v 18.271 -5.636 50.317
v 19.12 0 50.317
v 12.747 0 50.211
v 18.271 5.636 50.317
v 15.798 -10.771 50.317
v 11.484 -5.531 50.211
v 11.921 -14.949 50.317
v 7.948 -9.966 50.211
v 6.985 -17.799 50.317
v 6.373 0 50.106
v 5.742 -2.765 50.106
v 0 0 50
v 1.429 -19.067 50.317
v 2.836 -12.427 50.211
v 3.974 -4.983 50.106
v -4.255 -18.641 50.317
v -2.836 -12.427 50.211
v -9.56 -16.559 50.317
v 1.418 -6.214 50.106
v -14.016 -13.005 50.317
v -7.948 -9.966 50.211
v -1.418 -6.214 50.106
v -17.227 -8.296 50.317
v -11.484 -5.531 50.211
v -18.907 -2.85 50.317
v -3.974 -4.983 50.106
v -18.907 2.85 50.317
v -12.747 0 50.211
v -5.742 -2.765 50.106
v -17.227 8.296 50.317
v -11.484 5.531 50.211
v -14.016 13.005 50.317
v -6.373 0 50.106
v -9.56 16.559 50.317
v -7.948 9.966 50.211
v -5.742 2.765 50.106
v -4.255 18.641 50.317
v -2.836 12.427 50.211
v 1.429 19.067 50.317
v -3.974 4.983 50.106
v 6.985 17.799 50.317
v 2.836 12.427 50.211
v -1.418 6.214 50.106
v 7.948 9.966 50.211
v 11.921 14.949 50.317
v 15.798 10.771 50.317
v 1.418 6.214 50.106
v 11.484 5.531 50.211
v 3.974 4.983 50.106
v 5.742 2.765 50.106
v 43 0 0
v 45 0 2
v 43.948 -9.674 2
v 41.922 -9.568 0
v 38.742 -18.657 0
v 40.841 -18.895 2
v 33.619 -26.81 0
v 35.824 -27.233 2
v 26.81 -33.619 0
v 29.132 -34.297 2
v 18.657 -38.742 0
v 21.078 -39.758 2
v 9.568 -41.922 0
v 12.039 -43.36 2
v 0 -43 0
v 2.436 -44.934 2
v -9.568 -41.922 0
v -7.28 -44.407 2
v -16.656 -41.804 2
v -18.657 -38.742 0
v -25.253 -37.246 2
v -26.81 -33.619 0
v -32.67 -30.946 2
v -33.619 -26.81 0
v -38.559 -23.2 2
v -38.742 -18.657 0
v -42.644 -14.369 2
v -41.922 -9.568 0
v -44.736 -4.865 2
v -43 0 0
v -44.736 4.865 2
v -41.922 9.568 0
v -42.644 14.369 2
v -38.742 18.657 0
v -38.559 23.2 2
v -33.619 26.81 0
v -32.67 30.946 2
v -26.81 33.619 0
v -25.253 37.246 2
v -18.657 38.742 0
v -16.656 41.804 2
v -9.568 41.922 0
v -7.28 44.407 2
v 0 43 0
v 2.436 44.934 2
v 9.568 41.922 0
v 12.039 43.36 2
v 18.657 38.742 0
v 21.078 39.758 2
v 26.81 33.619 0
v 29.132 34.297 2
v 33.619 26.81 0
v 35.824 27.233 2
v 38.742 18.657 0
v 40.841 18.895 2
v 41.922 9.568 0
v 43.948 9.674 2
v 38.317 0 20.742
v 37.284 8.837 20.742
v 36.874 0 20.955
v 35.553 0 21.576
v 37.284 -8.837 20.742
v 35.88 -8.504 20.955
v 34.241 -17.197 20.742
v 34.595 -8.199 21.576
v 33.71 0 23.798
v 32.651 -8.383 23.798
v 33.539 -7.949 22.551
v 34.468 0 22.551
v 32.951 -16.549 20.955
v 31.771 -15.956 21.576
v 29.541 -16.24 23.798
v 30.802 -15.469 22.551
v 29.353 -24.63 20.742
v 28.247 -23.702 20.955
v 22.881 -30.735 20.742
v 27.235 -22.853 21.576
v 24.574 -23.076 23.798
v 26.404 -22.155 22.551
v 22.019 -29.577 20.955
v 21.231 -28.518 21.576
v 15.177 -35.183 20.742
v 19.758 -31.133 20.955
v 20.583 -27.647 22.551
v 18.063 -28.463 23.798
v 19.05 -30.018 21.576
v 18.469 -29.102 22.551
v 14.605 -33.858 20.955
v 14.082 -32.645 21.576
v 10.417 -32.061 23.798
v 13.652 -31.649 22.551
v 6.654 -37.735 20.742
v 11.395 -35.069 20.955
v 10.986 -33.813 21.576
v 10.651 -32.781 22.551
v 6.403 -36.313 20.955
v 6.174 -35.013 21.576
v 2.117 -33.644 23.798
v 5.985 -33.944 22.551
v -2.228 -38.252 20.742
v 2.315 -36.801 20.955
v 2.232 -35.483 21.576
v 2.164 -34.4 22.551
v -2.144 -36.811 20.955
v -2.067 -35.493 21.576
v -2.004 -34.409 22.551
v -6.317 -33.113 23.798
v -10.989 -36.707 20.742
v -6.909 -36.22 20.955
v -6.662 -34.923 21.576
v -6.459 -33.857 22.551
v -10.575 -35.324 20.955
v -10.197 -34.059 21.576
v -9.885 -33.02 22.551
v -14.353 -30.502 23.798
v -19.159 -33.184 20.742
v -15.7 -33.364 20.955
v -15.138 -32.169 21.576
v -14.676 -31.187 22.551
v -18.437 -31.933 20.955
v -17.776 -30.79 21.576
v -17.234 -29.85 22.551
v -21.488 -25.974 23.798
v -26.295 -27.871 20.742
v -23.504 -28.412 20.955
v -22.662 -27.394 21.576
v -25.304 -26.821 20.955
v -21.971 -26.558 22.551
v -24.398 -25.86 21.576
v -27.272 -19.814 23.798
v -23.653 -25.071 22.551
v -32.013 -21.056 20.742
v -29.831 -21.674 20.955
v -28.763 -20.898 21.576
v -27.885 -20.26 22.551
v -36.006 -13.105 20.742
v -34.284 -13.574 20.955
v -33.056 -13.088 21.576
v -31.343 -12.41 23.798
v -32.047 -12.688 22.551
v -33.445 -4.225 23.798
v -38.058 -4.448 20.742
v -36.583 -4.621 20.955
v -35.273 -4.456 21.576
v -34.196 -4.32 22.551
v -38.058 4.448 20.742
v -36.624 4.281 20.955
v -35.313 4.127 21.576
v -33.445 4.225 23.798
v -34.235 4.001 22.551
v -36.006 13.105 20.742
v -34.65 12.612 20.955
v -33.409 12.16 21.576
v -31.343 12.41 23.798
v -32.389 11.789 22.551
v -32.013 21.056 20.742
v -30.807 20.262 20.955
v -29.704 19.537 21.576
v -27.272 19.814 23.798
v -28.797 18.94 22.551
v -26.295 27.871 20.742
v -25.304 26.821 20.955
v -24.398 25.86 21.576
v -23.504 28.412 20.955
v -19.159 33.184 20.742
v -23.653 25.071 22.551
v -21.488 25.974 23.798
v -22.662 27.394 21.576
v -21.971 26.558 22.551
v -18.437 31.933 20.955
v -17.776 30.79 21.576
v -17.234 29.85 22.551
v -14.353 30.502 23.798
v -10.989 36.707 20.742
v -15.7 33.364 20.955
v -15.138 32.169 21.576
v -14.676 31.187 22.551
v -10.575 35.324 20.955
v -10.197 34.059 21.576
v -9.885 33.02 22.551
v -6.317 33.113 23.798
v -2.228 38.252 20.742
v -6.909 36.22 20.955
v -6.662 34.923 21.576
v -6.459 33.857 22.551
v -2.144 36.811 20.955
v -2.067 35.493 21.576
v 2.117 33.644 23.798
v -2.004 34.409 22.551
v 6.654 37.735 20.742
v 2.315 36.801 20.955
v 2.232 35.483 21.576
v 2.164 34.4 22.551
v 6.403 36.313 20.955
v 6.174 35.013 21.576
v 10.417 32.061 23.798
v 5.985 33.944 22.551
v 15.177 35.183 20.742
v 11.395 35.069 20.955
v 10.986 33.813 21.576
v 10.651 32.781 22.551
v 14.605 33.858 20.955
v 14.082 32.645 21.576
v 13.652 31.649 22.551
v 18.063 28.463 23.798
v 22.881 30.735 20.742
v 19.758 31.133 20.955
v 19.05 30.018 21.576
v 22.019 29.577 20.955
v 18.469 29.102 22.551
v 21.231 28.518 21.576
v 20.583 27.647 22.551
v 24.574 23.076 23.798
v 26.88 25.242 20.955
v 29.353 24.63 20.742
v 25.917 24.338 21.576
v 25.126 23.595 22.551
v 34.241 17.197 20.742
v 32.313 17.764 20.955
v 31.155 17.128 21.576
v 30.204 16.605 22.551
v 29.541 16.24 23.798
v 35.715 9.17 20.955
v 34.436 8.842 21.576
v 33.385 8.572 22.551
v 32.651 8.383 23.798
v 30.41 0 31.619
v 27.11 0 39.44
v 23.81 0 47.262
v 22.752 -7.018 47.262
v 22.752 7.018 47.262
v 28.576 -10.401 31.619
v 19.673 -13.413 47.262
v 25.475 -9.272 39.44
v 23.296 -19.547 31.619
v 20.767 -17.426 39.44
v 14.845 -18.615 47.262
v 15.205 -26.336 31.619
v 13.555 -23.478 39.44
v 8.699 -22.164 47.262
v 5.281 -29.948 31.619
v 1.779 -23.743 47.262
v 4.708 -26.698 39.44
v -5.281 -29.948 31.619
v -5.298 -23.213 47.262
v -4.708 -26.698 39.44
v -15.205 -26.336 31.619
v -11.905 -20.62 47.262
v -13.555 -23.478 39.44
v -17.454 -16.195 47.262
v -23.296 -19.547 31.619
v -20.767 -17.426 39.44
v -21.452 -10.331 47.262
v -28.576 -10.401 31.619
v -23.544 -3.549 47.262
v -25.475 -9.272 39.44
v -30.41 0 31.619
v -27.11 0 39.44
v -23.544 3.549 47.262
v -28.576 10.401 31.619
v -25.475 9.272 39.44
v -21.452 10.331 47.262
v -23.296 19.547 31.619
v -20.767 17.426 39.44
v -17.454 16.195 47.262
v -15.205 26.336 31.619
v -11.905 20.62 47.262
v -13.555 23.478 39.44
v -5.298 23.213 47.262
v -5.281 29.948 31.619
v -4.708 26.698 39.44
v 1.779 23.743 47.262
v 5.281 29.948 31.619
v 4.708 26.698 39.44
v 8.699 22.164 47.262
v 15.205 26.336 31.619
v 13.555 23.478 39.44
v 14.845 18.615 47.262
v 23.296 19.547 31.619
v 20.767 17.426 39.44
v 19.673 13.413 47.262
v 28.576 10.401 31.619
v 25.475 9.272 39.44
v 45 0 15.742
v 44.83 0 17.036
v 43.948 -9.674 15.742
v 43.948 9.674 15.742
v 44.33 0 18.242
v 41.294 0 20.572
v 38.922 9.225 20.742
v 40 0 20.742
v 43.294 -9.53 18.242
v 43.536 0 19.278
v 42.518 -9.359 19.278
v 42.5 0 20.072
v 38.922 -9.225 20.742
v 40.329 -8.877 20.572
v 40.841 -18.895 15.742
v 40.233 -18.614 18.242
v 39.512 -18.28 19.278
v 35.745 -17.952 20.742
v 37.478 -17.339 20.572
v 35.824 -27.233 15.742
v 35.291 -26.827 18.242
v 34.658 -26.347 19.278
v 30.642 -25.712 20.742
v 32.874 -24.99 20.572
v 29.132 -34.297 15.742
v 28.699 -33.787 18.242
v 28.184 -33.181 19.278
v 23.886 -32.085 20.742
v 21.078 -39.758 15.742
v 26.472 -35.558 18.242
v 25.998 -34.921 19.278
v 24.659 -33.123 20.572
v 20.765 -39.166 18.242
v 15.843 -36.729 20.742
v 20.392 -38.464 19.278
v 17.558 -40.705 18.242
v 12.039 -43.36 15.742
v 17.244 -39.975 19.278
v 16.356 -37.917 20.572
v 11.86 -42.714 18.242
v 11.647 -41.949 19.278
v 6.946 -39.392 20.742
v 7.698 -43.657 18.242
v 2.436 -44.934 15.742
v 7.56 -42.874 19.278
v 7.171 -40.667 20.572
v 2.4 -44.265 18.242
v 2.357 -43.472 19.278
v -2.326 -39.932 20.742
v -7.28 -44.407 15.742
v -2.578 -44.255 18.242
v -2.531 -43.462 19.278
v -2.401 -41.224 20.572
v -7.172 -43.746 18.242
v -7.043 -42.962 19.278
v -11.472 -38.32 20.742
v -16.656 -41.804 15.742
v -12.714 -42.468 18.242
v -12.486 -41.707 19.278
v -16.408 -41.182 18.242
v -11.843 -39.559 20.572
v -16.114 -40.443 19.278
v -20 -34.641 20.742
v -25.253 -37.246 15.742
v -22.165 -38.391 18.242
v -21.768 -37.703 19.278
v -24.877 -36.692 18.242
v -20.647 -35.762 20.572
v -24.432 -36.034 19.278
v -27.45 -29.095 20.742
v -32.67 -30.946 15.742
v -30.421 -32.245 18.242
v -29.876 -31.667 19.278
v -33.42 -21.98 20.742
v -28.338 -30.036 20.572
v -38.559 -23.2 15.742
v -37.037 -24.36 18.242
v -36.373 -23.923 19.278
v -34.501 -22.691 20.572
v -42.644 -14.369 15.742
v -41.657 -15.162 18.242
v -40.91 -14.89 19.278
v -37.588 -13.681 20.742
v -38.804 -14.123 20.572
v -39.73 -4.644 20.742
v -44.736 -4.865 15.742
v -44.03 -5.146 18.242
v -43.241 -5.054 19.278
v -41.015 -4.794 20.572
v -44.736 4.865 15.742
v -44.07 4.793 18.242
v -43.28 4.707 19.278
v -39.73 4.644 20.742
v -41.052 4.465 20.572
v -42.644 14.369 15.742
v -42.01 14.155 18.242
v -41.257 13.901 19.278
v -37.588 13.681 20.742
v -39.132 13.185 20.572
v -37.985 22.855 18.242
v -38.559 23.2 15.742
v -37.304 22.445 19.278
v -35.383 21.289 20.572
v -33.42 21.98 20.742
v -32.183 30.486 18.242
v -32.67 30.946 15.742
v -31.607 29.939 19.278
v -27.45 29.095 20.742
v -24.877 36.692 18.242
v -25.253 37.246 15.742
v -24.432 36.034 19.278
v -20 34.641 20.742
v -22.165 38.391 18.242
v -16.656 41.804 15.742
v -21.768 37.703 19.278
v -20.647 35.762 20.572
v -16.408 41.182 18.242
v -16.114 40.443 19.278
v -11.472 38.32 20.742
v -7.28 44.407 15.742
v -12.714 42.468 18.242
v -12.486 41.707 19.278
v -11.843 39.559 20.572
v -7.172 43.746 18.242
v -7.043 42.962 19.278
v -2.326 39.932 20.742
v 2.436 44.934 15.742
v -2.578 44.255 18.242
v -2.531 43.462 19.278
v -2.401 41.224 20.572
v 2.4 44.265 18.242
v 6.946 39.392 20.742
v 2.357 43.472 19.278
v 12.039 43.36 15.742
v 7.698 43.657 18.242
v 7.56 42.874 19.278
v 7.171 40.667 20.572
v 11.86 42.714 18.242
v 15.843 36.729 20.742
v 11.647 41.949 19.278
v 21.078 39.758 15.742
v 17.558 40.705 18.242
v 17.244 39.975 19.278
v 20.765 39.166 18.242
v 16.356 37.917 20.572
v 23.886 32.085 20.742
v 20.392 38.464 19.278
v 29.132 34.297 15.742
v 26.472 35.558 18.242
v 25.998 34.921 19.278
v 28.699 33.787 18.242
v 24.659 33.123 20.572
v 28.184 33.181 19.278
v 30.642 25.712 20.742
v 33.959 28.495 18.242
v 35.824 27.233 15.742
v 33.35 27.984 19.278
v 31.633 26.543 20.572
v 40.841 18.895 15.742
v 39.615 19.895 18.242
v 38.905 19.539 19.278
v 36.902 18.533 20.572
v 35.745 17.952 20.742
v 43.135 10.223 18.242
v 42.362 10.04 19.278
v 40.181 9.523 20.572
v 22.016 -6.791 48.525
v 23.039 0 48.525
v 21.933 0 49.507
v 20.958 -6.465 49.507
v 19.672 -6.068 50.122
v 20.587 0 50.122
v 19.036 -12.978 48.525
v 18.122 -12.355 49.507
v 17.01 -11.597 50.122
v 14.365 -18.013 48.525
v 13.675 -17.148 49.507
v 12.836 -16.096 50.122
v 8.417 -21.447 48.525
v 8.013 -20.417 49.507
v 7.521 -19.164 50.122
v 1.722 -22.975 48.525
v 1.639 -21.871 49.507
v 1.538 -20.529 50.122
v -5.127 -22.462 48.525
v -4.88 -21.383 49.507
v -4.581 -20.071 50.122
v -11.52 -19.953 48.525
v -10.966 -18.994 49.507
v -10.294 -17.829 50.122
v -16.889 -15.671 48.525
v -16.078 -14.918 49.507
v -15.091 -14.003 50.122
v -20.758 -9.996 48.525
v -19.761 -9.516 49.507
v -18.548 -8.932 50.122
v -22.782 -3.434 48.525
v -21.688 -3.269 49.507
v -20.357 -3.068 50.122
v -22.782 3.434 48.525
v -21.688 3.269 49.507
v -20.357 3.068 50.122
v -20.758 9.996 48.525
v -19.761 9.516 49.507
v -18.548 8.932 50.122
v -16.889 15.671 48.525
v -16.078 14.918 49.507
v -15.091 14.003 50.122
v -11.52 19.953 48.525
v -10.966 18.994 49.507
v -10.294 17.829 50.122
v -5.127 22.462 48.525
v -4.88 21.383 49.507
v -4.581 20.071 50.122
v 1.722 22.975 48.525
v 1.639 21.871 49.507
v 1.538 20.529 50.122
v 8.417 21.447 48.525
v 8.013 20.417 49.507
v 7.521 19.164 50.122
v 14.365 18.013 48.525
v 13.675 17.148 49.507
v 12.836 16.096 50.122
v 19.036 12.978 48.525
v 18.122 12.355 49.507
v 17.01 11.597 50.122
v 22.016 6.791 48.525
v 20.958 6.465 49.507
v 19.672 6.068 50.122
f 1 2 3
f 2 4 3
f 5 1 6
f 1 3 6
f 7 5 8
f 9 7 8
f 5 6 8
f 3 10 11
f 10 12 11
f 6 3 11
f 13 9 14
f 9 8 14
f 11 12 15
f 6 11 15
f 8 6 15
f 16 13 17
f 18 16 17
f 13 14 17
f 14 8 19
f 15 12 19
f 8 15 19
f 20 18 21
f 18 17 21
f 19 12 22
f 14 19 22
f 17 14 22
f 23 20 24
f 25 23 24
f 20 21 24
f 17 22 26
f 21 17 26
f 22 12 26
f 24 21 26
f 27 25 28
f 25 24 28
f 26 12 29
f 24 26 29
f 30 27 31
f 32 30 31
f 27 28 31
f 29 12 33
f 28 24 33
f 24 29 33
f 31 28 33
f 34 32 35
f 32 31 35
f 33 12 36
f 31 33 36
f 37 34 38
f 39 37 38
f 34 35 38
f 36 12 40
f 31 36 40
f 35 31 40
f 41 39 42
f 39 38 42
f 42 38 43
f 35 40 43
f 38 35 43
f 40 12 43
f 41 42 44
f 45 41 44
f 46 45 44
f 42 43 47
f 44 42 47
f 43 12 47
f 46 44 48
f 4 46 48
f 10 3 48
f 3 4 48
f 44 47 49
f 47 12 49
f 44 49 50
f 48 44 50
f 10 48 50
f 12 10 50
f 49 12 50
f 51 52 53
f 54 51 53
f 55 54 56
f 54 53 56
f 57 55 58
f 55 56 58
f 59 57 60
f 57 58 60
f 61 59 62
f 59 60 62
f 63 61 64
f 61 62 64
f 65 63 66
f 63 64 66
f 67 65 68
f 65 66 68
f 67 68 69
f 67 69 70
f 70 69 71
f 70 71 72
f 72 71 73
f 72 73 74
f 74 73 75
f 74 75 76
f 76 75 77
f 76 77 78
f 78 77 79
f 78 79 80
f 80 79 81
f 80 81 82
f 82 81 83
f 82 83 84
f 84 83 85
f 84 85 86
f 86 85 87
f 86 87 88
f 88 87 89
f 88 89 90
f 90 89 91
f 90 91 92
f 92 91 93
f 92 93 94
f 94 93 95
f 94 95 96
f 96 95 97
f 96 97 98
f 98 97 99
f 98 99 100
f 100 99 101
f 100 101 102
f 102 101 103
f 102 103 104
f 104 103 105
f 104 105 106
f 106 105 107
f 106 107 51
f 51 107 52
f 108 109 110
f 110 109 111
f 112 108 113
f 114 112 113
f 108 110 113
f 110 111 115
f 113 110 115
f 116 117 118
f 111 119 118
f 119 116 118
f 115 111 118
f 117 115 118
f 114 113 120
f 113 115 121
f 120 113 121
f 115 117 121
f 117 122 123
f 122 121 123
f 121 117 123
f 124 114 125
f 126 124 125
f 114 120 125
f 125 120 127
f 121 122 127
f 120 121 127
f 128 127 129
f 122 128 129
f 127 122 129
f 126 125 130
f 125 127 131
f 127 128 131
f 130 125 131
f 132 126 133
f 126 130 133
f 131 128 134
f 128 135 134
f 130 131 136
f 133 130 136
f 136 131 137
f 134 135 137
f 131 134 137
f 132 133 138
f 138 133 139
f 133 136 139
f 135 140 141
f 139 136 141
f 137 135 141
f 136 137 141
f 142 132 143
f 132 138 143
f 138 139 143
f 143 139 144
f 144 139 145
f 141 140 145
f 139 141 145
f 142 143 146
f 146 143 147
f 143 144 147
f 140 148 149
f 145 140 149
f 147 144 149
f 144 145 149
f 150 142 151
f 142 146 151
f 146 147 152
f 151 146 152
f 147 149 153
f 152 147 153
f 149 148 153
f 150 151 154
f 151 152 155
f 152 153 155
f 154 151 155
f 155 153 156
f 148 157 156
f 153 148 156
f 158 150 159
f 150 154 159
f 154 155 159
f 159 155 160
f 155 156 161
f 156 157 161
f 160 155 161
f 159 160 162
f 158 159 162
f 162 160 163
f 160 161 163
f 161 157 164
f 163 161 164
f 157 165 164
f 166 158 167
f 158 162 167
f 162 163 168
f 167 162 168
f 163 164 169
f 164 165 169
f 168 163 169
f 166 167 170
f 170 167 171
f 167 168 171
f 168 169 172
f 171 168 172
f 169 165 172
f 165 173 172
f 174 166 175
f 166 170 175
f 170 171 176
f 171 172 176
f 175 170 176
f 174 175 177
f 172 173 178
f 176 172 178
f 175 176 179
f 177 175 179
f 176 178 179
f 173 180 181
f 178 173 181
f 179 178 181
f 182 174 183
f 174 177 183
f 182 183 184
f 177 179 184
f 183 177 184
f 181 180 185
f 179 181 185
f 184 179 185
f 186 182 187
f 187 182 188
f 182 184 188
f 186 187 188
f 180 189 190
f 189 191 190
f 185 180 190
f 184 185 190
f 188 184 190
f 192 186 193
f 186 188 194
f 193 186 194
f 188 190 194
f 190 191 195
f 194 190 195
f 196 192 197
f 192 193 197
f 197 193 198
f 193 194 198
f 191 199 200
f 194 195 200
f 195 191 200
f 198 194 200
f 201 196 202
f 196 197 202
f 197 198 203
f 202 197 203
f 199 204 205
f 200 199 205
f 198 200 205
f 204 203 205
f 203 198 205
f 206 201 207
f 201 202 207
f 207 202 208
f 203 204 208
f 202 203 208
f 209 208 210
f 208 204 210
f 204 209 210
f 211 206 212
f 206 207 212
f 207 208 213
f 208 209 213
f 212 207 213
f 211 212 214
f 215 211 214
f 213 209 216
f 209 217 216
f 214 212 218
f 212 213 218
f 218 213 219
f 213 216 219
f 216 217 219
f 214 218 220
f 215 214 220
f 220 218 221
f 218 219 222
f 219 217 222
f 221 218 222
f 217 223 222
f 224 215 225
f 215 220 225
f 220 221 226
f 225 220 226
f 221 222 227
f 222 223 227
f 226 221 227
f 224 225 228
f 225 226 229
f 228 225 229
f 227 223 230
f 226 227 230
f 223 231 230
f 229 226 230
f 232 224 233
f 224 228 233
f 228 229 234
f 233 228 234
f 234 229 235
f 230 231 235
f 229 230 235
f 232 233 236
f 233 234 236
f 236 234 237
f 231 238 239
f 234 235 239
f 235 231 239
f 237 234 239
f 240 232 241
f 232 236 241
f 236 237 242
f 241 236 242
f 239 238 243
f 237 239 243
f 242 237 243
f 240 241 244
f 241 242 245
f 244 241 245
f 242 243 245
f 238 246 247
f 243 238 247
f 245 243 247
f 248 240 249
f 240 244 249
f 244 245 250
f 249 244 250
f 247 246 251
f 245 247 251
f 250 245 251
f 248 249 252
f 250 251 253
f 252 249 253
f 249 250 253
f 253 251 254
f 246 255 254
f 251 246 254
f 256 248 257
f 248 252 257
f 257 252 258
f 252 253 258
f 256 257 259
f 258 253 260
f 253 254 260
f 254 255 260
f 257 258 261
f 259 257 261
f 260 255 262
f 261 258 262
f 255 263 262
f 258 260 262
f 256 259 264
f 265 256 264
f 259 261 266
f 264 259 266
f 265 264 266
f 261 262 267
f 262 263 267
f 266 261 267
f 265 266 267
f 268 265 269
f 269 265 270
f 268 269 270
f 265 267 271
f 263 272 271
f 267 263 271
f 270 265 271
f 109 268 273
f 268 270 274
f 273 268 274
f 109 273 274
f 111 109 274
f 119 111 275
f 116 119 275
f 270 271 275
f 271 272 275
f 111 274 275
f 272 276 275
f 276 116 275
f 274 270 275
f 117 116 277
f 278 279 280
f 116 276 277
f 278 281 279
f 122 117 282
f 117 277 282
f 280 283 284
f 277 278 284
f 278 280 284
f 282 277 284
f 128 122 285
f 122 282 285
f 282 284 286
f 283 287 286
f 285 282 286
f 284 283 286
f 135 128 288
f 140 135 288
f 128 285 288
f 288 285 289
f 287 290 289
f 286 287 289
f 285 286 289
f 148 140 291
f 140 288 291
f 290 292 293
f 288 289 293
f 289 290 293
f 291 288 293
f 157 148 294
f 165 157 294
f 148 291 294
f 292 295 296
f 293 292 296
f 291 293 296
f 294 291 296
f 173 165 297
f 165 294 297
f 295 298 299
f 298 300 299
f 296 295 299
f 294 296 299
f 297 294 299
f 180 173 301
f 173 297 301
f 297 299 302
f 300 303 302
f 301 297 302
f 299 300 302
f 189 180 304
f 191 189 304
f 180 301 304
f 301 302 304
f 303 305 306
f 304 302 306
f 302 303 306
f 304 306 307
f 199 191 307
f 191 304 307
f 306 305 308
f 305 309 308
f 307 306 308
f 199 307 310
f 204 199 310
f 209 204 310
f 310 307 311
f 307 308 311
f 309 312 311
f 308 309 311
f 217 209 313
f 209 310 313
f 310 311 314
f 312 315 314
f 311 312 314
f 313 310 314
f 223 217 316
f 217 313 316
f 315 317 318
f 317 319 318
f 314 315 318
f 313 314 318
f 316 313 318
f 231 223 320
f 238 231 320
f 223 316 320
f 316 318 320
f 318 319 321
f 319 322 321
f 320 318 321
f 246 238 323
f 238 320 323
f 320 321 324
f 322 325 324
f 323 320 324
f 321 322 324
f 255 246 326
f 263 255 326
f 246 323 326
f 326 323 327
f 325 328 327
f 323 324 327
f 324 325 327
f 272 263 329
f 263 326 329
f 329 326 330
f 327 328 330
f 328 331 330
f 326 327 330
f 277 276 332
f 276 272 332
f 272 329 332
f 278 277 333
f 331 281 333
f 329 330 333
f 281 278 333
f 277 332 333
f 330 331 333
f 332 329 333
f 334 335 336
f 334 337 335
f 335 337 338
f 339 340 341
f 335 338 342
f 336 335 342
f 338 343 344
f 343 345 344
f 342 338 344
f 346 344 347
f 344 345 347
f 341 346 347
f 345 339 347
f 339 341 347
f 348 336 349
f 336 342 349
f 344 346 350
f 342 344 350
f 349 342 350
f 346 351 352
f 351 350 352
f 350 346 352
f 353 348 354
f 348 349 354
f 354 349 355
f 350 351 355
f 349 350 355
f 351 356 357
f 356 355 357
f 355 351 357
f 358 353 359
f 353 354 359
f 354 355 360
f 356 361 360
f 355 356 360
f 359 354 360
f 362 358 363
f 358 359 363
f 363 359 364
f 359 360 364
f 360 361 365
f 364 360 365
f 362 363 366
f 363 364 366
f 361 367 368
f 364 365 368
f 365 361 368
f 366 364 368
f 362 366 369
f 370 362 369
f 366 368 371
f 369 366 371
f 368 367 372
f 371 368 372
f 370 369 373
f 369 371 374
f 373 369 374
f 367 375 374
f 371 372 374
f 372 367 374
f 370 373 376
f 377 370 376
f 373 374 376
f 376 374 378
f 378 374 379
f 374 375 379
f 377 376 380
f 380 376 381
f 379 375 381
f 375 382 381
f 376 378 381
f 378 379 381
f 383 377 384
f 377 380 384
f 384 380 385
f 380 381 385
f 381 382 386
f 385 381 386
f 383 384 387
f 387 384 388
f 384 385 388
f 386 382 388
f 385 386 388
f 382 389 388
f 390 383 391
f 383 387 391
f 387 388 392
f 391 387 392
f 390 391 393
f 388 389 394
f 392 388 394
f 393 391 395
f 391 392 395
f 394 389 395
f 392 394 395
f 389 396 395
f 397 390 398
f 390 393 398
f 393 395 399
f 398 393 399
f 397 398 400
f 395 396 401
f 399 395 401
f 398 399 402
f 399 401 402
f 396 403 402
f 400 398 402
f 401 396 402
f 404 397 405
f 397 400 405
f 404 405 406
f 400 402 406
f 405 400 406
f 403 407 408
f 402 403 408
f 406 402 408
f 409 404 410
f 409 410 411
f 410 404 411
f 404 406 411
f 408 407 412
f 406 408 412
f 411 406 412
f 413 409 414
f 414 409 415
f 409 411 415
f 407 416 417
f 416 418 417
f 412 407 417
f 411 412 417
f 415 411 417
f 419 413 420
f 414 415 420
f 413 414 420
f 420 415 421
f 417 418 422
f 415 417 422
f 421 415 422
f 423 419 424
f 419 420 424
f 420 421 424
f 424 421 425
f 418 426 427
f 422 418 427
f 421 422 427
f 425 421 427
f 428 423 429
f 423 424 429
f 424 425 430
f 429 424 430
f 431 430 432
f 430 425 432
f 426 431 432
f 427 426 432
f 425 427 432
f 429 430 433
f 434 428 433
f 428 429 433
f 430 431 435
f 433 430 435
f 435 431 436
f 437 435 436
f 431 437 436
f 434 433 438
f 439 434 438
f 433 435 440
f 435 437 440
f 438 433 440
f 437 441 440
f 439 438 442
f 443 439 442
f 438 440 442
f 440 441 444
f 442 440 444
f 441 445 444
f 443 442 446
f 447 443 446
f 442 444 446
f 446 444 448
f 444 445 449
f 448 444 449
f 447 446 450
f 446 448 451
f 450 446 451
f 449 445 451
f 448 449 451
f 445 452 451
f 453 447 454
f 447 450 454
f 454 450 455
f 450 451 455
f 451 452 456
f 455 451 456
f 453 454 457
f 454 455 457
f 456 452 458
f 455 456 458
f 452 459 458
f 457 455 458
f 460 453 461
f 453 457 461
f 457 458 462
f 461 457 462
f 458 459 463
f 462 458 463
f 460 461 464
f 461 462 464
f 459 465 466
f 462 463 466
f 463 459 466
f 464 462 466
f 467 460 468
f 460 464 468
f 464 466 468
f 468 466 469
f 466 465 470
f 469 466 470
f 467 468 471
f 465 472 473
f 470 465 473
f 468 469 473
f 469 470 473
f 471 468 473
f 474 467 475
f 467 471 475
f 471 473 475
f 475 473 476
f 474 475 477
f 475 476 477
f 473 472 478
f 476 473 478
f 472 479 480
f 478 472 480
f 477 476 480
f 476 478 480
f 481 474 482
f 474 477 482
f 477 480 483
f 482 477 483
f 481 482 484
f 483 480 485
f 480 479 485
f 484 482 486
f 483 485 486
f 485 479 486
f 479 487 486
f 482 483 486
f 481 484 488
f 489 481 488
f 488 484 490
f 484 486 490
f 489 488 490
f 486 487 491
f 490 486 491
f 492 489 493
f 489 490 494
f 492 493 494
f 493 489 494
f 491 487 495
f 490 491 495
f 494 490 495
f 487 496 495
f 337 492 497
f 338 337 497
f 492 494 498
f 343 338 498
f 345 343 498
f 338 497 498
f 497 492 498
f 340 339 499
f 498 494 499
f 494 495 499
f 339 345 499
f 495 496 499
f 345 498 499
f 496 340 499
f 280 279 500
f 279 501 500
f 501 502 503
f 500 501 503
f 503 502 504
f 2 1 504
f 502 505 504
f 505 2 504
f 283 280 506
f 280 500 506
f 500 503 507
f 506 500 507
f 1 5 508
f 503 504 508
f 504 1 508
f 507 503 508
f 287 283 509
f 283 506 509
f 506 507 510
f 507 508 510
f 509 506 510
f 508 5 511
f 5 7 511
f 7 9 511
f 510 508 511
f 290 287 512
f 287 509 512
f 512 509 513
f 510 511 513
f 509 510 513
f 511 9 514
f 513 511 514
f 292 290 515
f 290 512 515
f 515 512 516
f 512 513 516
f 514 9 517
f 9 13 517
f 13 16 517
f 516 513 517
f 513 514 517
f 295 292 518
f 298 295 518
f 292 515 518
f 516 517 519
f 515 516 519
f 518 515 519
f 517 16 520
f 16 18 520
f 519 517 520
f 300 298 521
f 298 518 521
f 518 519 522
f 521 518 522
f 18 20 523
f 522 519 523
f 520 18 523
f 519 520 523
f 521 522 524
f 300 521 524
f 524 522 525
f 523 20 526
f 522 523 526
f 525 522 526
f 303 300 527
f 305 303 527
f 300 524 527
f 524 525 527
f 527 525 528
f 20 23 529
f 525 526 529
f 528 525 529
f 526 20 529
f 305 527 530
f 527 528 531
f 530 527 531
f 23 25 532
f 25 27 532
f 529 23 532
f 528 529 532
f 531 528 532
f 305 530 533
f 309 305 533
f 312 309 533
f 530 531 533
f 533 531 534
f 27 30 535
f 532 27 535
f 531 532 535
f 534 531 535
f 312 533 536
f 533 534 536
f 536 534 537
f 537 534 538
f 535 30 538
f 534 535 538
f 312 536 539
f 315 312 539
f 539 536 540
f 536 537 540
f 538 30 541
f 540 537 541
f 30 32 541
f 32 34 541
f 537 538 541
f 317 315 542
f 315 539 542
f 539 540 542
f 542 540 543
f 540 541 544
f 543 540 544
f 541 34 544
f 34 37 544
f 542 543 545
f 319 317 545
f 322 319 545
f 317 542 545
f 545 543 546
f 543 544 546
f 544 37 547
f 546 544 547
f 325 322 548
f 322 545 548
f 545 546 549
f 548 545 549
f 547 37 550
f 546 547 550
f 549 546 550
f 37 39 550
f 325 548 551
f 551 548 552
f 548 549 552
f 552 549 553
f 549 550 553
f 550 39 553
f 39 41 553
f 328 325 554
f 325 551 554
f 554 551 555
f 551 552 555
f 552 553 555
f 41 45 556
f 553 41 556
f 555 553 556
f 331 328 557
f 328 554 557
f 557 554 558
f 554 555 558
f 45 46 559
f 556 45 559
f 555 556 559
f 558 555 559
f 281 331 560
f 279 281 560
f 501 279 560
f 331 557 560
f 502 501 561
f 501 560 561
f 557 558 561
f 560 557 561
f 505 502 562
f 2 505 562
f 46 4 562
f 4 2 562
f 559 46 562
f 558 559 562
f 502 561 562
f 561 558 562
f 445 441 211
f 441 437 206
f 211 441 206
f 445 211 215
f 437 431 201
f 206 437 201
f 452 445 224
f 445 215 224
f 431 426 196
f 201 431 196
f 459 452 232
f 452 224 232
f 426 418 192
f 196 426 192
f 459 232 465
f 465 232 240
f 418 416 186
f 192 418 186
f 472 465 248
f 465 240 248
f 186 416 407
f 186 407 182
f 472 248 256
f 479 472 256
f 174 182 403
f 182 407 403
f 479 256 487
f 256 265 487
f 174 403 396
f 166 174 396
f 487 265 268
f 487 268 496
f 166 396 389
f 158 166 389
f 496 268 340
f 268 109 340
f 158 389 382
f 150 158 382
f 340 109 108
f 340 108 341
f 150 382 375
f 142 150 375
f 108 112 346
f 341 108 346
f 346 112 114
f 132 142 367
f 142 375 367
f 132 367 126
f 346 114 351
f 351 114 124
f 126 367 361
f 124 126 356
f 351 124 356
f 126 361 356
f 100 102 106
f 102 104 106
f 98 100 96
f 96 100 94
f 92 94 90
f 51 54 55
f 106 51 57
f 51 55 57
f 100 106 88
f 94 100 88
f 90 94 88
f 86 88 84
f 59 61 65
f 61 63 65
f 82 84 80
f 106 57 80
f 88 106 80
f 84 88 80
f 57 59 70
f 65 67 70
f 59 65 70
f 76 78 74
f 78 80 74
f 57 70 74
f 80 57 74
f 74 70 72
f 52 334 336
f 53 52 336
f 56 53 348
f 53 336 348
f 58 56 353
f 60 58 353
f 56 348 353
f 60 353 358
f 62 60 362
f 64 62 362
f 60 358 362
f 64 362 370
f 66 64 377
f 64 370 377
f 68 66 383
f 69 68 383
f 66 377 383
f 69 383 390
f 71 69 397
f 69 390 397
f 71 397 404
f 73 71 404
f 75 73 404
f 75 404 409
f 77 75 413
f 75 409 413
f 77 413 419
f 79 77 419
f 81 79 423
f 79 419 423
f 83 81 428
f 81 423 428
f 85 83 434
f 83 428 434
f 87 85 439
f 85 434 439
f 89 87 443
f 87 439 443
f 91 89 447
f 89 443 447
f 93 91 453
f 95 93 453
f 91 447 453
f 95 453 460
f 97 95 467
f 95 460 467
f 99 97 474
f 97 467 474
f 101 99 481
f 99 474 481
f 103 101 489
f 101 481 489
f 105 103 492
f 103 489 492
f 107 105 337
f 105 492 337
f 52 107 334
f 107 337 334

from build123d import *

# Parameters (mm, degrees)
F2_SIZE = 2


with BuildPart() as f1:
    # F0 (on Front) → F1 (revolve)
    with BuildSketch(Plane.XZ):
        with BuildLine():
            Line((19.120241, 50.317076), (0, 50))
            Line((0, 50), (0, 0))
            Line((0, 0), (45, 0))
            Line((45, 0), (45, 15.742122))
            ThreePointArc((45, 15.742122), (43.535534, 19.277656), (40, 20.742122))
            Line((40, 20.742122), (38.317099, 20.742122))
            ThreePointArc((38.317099, 20.742122), (35.552971, 21.575637), (33.71042, 23.798285))
            Line((33.71042, 23.798285), (23.809825, 47.2616))
            ThreePointArc((23.809825, 47.2616), (21.932636, 49.507021), (19.120241, 50.317076))
        make_face()
    revolve(axis=Axis((0, 0, 15.365856), (0, 0, -1)))

    # F2
    f2_edges = [f1.edges().sort_by_distance(p)[0] for p in [
        (-45, 0, 0),
    ]]
    chamfer(f2_edges, length=F2_SIZE)


solid = f1.part
